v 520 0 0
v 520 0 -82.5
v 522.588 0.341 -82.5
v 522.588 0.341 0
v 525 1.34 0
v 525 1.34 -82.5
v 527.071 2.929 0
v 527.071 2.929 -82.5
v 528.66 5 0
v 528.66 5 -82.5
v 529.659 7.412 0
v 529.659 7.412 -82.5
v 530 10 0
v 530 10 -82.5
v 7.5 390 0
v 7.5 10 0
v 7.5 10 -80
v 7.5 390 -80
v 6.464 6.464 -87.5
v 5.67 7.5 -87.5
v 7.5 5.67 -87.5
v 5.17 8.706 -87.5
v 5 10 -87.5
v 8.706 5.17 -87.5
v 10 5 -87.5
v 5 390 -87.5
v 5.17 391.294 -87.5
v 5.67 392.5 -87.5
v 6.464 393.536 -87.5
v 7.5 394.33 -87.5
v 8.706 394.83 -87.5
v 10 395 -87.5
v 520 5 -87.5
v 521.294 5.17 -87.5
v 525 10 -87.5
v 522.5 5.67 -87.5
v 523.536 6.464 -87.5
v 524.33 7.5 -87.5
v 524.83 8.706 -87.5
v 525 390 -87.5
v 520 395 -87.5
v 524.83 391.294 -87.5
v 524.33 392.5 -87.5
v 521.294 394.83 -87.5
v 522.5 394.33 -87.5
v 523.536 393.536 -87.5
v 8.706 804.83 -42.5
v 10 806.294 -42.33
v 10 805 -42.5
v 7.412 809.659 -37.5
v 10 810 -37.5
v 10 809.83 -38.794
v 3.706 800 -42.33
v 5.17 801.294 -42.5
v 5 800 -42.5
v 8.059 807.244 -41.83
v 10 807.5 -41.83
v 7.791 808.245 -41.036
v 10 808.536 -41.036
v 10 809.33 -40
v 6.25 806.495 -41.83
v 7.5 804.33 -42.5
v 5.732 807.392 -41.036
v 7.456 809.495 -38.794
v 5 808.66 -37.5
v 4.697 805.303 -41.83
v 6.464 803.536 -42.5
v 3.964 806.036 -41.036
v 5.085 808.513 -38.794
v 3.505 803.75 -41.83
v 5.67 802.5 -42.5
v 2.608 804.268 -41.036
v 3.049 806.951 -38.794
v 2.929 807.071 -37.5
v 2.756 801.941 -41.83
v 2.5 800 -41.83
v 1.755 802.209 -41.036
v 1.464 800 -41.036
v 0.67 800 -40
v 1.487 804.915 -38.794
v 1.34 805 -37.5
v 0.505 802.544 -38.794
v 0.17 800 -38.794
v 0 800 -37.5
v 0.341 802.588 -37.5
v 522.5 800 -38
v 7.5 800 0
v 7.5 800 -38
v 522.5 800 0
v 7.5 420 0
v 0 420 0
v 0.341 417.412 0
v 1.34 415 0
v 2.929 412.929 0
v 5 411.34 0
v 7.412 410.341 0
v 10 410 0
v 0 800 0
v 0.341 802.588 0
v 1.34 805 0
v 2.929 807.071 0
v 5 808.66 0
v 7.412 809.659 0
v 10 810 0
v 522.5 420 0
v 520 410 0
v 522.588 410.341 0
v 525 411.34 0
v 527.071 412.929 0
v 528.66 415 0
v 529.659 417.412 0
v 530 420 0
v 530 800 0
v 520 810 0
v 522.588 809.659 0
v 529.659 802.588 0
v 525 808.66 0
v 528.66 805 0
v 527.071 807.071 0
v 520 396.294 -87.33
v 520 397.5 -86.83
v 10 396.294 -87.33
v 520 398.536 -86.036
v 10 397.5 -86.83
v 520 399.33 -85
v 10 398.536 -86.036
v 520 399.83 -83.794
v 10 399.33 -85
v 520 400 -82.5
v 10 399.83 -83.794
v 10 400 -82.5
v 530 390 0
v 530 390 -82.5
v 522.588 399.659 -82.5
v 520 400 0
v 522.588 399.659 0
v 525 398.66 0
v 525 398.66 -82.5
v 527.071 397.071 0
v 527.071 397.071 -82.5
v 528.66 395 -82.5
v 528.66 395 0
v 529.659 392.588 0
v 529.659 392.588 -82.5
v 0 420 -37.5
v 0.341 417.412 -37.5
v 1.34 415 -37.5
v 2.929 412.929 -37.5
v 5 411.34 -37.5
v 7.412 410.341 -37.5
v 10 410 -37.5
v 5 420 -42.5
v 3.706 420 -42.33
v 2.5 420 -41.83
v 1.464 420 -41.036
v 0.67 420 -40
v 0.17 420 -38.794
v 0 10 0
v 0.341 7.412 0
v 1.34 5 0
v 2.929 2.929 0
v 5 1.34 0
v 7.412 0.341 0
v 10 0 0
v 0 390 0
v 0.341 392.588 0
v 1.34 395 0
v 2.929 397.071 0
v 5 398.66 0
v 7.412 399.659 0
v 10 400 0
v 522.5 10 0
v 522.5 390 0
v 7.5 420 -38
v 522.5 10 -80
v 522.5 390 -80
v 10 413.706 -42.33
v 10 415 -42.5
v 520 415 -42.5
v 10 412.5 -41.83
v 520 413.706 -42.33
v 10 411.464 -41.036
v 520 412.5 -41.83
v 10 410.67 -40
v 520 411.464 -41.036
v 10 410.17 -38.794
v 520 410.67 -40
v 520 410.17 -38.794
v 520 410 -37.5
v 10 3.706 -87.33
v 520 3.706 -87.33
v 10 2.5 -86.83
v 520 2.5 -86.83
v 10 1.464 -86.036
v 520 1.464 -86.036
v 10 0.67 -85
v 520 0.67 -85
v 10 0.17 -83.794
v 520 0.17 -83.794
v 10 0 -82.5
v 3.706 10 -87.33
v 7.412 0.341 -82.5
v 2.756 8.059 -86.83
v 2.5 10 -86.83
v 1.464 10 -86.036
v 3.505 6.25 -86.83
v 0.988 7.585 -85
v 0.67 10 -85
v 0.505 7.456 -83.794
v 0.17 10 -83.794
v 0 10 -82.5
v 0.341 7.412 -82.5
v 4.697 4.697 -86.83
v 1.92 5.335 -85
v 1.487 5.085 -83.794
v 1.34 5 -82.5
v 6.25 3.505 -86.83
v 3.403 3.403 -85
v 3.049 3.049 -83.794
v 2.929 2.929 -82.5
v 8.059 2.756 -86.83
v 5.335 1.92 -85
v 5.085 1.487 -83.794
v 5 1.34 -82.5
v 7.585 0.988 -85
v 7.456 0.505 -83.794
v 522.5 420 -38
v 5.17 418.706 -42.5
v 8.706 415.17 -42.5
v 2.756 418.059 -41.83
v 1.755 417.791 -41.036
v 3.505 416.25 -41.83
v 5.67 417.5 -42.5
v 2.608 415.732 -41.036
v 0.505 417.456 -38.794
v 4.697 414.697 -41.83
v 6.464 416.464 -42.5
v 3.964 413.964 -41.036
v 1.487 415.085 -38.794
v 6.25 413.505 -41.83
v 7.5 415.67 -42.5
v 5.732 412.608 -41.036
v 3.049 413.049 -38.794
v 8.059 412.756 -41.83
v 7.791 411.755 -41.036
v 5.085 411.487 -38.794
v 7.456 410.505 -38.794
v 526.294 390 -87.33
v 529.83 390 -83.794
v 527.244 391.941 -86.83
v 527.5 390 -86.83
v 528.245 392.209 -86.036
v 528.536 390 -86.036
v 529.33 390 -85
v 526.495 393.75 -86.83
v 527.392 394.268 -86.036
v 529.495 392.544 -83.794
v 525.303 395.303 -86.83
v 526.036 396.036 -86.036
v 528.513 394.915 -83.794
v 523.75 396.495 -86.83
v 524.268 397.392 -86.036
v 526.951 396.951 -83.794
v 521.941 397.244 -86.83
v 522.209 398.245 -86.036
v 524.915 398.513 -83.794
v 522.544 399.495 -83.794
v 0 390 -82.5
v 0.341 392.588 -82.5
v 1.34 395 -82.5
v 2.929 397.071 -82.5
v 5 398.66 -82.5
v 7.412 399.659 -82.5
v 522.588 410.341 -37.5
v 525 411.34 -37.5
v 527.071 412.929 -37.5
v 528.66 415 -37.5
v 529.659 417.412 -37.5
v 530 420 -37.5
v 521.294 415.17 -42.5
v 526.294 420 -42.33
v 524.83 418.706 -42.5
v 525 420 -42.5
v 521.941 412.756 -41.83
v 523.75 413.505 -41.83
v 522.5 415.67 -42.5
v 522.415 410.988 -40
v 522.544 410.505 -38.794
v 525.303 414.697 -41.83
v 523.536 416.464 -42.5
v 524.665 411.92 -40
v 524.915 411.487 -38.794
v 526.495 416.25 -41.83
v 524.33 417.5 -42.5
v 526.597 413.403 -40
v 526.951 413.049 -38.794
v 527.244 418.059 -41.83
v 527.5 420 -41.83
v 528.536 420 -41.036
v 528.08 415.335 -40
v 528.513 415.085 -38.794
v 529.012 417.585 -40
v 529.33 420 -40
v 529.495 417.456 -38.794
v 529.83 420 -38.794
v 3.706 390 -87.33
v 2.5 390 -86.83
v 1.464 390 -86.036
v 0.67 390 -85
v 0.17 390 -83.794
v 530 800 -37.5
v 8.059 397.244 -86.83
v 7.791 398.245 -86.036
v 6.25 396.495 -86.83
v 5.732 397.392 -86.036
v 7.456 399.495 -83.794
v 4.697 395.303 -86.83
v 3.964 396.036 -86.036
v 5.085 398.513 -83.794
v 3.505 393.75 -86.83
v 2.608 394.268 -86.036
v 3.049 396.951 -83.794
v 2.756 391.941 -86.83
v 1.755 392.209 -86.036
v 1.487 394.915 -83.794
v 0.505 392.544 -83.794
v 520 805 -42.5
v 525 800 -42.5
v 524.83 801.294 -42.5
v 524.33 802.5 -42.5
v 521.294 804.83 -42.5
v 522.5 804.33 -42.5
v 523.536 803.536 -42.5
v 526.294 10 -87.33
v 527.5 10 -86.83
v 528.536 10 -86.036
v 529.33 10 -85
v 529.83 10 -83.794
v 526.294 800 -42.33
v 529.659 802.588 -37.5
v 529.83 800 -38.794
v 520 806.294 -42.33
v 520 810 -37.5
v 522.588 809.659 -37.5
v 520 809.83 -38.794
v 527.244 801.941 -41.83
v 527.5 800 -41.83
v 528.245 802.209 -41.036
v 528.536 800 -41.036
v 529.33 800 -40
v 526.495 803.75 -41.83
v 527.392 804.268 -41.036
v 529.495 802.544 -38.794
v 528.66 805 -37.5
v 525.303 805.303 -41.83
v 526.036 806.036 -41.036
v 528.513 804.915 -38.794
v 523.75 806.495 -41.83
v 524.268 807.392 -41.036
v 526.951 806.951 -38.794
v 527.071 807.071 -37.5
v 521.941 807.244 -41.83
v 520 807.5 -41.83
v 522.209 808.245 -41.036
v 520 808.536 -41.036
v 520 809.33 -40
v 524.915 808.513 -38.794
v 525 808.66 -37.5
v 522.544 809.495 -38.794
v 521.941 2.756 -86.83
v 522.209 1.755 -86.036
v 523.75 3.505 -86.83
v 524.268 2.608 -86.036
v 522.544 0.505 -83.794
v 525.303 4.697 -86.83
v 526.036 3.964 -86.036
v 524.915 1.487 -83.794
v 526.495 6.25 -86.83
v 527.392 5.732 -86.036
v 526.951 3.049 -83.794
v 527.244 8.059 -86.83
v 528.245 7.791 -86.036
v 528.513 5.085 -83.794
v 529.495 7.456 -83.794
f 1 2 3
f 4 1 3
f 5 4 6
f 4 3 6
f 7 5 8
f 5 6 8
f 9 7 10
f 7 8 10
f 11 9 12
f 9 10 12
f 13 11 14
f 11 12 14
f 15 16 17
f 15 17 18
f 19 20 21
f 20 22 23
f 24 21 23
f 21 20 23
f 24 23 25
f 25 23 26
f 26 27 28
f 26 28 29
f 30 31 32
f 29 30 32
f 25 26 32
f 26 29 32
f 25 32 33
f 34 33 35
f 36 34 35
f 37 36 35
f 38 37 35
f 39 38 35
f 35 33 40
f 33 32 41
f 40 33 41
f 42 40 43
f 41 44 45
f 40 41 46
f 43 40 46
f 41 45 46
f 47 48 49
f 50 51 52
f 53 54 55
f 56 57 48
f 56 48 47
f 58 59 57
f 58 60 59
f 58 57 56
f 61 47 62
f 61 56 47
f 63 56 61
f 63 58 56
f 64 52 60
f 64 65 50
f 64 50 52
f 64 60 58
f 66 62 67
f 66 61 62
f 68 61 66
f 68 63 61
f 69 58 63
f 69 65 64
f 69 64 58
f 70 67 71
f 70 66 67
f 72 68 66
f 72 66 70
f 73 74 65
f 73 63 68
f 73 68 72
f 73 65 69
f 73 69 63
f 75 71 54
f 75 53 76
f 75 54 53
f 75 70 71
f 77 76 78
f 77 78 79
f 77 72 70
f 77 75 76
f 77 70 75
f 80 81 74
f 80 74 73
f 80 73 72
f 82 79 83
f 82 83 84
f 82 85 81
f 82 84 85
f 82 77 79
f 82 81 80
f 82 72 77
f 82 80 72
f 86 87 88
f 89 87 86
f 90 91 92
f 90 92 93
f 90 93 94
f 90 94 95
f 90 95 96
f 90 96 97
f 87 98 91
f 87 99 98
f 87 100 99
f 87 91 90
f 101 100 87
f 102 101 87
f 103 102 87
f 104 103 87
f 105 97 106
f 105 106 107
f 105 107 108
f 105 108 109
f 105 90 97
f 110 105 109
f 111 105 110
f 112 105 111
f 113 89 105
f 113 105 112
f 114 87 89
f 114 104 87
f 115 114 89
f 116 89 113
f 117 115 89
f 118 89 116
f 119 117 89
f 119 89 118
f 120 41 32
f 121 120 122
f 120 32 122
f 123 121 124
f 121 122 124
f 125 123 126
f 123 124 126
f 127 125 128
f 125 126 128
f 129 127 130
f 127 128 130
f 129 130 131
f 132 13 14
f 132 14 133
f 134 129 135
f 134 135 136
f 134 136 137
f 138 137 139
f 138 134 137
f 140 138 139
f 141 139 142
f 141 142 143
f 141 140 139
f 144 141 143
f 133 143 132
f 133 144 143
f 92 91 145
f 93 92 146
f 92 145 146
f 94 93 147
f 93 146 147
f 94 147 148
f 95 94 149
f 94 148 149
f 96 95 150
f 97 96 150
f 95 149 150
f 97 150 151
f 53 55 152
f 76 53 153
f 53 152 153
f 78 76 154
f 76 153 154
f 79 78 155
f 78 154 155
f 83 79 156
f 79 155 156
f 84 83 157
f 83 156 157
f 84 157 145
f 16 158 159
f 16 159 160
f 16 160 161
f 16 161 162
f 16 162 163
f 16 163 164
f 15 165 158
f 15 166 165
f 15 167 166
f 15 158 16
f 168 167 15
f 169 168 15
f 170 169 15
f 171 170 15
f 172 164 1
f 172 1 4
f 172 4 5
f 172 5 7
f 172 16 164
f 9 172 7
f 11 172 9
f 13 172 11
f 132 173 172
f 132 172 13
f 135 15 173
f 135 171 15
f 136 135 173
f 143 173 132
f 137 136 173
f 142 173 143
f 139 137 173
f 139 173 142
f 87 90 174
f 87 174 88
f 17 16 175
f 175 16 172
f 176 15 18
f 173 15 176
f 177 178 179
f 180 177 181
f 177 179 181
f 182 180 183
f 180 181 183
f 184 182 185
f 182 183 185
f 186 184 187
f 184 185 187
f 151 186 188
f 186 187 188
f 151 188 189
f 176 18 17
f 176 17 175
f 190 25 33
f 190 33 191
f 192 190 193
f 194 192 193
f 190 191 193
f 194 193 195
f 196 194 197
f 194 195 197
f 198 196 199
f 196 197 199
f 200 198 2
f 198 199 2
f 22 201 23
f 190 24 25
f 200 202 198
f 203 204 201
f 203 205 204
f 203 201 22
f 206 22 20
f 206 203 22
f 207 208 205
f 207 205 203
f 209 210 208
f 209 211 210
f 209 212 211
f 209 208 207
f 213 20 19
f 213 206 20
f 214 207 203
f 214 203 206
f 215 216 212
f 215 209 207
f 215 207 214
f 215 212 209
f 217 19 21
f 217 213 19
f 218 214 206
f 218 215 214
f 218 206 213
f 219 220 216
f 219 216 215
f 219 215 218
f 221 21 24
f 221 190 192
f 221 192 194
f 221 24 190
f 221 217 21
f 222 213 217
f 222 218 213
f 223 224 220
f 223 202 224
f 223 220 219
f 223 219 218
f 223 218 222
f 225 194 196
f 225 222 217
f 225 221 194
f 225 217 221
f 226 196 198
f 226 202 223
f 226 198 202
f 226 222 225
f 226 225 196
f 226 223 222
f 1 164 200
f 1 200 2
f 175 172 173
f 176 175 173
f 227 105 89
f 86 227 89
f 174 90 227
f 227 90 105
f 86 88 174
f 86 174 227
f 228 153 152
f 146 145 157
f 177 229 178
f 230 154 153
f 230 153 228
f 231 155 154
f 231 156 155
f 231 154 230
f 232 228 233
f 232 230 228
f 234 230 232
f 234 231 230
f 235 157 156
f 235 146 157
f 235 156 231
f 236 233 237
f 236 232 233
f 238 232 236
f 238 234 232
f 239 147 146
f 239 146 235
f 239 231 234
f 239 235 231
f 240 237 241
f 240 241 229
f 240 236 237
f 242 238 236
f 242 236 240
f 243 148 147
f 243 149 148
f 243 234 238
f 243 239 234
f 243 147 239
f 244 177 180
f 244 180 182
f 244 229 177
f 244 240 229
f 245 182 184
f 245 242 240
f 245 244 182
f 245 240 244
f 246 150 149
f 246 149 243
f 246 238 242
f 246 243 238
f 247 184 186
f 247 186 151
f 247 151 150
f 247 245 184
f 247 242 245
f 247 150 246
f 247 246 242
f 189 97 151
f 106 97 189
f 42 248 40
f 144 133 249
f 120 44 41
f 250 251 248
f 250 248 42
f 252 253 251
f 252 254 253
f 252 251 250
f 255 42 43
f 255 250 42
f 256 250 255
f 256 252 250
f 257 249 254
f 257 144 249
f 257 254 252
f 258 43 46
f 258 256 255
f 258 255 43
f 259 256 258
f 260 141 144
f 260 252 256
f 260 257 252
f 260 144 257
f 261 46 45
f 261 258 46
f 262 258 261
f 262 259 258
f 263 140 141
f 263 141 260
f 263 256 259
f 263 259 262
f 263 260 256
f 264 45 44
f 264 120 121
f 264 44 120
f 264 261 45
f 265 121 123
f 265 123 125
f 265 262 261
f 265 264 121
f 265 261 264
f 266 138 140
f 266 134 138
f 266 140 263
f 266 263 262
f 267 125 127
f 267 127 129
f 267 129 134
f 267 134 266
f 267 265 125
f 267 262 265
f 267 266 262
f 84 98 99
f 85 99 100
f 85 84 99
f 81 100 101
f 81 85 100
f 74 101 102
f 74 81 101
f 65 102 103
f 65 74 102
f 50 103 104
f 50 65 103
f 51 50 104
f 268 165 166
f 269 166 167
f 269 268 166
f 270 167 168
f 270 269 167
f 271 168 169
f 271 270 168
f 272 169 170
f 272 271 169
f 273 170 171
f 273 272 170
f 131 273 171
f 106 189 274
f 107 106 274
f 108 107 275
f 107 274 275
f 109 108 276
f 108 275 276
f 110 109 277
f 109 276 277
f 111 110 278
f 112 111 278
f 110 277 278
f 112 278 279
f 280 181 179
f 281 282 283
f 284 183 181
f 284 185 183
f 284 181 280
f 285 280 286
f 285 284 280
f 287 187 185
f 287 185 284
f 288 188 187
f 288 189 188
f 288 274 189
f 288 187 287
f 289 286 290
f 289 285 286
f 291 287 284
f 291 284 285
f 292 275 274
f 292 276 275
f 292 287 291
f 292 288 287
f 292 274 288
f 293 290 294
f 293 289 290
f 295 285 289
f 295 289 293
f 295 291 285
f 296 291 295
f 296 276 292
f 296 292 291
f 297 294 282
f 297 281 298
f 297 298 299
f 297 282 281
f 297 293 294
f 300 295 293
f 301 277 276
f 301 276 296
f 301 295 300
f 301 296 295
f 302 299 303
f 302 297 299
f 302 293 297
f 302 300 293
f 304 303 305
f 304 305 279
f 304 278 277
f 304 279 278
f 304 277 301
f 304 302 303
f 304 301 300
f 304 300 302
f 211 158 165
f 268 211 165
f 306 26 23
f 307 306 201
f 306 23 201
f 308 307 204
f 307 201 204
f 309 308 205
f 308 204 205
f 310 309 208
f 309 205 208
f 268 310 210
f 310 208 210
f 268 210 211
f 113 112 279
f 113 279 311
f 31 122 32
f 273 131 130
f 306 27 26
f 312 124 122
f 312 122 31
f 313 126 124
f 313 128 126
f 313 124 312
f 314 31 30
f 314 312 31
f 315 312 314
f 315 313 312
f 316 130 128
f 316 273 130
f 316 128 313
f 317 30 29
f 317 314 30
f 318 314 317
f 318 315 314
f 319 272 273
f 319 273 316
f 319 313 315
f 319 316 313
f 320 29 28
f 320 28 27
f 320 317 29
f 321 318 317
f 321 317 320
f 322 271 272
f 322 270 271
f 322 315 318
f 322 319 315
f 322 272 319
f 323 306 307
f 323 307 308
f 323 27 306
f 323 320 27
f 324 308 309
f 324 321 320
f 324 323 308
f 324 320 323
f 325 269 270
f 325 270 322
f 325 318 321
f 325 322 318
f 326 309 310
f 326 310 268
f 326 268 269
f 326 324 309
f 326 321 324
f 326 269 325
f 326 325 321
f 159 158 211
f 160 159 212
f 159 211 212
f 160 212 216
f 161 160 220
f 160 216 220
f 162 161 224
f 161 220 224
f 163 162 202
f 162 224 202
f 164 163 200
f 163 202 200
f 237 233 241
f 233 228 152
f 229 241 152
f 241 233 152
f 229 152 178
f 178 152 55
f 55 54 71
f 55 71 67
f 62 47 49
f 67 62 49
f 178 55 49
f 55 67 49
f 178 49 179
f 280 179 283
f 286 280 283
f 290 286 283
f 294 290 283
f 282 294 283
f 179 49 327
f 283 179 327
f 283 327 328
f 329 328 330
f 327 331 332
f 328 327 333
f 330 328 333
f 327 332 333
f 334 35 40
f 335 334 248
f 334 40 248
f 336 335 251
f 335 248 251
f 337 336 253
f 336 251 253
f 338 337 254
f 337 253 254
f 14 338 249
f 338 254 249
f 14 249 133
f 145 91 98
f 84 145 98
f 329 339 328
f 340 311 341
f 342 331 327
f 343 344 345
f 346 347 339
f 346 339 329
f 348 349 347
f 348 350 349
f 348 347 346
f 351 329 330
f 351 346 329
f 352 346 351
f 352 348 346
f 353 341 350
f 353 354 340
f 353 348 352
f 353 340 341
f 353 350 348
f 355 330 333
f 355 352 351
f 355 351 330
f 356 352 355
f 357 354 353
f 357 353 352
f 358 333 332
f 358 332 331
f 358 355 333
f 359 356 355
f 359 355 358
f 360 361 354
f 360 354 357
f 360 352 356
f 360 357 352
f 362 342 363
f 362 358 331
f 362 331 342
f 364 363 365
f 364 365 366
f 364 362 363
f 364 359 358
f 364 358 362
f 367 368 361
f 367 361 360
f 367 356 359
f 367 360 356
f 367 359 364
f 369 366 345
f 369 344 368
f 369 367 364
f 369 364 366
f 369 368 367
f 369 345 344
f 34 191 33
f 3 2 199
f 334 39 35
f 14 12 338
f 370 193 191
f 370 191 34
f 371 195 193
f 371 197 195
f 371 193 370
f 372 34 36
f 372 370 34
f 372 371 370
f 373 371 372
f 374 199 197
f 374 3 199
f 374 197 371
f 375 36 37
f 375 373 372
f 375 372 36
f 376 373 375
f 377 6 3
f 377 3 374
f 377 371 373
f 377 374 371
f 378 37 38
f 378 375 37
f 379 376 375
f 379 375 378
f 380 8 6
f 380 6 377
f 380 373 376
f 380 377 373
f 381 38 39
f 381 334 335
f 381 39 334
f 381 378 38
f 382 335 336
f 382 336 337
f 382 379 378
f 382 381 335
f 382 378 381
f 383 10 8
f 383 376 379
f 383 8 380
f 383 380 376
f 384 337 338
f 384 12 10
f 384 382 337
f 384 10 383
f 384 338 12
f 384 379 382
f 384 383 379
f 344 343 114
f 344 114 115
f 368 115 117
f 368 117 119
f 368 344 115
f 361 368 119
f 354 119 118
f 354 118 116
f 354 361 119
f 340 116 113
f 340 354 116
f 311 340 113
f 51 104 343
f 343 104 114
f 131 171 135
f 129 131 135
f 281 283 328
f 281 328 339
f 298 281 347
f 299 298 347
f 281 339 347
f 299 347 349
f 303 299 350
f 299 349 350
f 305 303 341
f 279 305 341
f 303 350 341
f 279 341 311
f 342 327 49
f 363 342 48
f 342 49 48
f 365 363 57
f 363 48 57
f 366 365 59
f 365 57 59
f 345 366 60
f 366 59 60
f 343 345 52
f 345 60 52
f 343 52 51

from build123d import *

# Parameters (mm, degrees)
F0_W     = 530
F0_H     = 400
F1_DEPTH = 87.5
F2_W     = 530
F2_H     = 400
F3_DEPTH = 42.5
F4_W     = 515
F4_H     = 380
F5_DEPTH = 80
F6_W     = 515
F6_H     = 380
F7_DEPTH = 38
F8_R     = 10
F8_2_R   = 10
F9_R     = 5
F9_2_R   = 5


with BuildPart() as f1:
    # F0 (on Top) → F1 (new body)
    with BuildSketch(Plane.XY):
        with Locations((265, 200)):
            Rectangle(F0_W, F0_H)
    extrude(amount=-F1_DEPTH)

    # F4 (on face) → F5 (cut)
    with BuildSketch(Plane.XY):
        with Locations((265, 200)):
            Rectangle(F4_W, F4_H)
    extrude(amount=-F5_DEPTH, mode=Mode.SUBTRACT)

    # F8
    f8_edges = [f1.edges().sort_by_distance(p)[0] for p in [
        (0, 0, -43.75),
        (530, 0, -43.75),
        (530, 400, -43.75),
        (0, 400, -43.75),
    ]]
    fillet(f8_edges, radius=F8_R)

    # F9
    f9_edges = [f1.edges().sort_by_distance(p)[0] for p in [
        (265, 0, -87.5),
    ]]
    fillet(f9_edges, radius=F9_R)


with BuildPart() as f3:
    # F2 (on face) → F3 (new body)
    with BuildSketch(Plane.XY):
        with Locations((265, 610)):
            Rectangle(F2_W, F2_H)
    extrude(amount=-F3_DEPTH)

    # F6 (on face) → F7 (cut)
    with BuildSketch(Plane.XY):
        with Locations((265, 610)):
            Rectangle(F6_W, F6_H)
    extrude(amount=-F7_DEPTH, mode=Mode.SUBTRACT)

    # F8#2
    f8_2_edges = [f3.edges().sort_by_distance(p)[0] for p in [
        (530, 410, -21.25),
        (0, 410, -21.25),
        (0, 810, -21.25),
        (530, 810, -21.25),
    ]]
    fillet(f8_2_edges, radius=F8_2_R)

    # F9#2
    f9_2_edges = [f3.edges().sort_by_distance(p)[0] for p in [
        (530, 610, -42.5),
    ]]
    fillet(f9_2_edges, radius=F9_2_R)


solid = Compound([f1.part, f3.part])
